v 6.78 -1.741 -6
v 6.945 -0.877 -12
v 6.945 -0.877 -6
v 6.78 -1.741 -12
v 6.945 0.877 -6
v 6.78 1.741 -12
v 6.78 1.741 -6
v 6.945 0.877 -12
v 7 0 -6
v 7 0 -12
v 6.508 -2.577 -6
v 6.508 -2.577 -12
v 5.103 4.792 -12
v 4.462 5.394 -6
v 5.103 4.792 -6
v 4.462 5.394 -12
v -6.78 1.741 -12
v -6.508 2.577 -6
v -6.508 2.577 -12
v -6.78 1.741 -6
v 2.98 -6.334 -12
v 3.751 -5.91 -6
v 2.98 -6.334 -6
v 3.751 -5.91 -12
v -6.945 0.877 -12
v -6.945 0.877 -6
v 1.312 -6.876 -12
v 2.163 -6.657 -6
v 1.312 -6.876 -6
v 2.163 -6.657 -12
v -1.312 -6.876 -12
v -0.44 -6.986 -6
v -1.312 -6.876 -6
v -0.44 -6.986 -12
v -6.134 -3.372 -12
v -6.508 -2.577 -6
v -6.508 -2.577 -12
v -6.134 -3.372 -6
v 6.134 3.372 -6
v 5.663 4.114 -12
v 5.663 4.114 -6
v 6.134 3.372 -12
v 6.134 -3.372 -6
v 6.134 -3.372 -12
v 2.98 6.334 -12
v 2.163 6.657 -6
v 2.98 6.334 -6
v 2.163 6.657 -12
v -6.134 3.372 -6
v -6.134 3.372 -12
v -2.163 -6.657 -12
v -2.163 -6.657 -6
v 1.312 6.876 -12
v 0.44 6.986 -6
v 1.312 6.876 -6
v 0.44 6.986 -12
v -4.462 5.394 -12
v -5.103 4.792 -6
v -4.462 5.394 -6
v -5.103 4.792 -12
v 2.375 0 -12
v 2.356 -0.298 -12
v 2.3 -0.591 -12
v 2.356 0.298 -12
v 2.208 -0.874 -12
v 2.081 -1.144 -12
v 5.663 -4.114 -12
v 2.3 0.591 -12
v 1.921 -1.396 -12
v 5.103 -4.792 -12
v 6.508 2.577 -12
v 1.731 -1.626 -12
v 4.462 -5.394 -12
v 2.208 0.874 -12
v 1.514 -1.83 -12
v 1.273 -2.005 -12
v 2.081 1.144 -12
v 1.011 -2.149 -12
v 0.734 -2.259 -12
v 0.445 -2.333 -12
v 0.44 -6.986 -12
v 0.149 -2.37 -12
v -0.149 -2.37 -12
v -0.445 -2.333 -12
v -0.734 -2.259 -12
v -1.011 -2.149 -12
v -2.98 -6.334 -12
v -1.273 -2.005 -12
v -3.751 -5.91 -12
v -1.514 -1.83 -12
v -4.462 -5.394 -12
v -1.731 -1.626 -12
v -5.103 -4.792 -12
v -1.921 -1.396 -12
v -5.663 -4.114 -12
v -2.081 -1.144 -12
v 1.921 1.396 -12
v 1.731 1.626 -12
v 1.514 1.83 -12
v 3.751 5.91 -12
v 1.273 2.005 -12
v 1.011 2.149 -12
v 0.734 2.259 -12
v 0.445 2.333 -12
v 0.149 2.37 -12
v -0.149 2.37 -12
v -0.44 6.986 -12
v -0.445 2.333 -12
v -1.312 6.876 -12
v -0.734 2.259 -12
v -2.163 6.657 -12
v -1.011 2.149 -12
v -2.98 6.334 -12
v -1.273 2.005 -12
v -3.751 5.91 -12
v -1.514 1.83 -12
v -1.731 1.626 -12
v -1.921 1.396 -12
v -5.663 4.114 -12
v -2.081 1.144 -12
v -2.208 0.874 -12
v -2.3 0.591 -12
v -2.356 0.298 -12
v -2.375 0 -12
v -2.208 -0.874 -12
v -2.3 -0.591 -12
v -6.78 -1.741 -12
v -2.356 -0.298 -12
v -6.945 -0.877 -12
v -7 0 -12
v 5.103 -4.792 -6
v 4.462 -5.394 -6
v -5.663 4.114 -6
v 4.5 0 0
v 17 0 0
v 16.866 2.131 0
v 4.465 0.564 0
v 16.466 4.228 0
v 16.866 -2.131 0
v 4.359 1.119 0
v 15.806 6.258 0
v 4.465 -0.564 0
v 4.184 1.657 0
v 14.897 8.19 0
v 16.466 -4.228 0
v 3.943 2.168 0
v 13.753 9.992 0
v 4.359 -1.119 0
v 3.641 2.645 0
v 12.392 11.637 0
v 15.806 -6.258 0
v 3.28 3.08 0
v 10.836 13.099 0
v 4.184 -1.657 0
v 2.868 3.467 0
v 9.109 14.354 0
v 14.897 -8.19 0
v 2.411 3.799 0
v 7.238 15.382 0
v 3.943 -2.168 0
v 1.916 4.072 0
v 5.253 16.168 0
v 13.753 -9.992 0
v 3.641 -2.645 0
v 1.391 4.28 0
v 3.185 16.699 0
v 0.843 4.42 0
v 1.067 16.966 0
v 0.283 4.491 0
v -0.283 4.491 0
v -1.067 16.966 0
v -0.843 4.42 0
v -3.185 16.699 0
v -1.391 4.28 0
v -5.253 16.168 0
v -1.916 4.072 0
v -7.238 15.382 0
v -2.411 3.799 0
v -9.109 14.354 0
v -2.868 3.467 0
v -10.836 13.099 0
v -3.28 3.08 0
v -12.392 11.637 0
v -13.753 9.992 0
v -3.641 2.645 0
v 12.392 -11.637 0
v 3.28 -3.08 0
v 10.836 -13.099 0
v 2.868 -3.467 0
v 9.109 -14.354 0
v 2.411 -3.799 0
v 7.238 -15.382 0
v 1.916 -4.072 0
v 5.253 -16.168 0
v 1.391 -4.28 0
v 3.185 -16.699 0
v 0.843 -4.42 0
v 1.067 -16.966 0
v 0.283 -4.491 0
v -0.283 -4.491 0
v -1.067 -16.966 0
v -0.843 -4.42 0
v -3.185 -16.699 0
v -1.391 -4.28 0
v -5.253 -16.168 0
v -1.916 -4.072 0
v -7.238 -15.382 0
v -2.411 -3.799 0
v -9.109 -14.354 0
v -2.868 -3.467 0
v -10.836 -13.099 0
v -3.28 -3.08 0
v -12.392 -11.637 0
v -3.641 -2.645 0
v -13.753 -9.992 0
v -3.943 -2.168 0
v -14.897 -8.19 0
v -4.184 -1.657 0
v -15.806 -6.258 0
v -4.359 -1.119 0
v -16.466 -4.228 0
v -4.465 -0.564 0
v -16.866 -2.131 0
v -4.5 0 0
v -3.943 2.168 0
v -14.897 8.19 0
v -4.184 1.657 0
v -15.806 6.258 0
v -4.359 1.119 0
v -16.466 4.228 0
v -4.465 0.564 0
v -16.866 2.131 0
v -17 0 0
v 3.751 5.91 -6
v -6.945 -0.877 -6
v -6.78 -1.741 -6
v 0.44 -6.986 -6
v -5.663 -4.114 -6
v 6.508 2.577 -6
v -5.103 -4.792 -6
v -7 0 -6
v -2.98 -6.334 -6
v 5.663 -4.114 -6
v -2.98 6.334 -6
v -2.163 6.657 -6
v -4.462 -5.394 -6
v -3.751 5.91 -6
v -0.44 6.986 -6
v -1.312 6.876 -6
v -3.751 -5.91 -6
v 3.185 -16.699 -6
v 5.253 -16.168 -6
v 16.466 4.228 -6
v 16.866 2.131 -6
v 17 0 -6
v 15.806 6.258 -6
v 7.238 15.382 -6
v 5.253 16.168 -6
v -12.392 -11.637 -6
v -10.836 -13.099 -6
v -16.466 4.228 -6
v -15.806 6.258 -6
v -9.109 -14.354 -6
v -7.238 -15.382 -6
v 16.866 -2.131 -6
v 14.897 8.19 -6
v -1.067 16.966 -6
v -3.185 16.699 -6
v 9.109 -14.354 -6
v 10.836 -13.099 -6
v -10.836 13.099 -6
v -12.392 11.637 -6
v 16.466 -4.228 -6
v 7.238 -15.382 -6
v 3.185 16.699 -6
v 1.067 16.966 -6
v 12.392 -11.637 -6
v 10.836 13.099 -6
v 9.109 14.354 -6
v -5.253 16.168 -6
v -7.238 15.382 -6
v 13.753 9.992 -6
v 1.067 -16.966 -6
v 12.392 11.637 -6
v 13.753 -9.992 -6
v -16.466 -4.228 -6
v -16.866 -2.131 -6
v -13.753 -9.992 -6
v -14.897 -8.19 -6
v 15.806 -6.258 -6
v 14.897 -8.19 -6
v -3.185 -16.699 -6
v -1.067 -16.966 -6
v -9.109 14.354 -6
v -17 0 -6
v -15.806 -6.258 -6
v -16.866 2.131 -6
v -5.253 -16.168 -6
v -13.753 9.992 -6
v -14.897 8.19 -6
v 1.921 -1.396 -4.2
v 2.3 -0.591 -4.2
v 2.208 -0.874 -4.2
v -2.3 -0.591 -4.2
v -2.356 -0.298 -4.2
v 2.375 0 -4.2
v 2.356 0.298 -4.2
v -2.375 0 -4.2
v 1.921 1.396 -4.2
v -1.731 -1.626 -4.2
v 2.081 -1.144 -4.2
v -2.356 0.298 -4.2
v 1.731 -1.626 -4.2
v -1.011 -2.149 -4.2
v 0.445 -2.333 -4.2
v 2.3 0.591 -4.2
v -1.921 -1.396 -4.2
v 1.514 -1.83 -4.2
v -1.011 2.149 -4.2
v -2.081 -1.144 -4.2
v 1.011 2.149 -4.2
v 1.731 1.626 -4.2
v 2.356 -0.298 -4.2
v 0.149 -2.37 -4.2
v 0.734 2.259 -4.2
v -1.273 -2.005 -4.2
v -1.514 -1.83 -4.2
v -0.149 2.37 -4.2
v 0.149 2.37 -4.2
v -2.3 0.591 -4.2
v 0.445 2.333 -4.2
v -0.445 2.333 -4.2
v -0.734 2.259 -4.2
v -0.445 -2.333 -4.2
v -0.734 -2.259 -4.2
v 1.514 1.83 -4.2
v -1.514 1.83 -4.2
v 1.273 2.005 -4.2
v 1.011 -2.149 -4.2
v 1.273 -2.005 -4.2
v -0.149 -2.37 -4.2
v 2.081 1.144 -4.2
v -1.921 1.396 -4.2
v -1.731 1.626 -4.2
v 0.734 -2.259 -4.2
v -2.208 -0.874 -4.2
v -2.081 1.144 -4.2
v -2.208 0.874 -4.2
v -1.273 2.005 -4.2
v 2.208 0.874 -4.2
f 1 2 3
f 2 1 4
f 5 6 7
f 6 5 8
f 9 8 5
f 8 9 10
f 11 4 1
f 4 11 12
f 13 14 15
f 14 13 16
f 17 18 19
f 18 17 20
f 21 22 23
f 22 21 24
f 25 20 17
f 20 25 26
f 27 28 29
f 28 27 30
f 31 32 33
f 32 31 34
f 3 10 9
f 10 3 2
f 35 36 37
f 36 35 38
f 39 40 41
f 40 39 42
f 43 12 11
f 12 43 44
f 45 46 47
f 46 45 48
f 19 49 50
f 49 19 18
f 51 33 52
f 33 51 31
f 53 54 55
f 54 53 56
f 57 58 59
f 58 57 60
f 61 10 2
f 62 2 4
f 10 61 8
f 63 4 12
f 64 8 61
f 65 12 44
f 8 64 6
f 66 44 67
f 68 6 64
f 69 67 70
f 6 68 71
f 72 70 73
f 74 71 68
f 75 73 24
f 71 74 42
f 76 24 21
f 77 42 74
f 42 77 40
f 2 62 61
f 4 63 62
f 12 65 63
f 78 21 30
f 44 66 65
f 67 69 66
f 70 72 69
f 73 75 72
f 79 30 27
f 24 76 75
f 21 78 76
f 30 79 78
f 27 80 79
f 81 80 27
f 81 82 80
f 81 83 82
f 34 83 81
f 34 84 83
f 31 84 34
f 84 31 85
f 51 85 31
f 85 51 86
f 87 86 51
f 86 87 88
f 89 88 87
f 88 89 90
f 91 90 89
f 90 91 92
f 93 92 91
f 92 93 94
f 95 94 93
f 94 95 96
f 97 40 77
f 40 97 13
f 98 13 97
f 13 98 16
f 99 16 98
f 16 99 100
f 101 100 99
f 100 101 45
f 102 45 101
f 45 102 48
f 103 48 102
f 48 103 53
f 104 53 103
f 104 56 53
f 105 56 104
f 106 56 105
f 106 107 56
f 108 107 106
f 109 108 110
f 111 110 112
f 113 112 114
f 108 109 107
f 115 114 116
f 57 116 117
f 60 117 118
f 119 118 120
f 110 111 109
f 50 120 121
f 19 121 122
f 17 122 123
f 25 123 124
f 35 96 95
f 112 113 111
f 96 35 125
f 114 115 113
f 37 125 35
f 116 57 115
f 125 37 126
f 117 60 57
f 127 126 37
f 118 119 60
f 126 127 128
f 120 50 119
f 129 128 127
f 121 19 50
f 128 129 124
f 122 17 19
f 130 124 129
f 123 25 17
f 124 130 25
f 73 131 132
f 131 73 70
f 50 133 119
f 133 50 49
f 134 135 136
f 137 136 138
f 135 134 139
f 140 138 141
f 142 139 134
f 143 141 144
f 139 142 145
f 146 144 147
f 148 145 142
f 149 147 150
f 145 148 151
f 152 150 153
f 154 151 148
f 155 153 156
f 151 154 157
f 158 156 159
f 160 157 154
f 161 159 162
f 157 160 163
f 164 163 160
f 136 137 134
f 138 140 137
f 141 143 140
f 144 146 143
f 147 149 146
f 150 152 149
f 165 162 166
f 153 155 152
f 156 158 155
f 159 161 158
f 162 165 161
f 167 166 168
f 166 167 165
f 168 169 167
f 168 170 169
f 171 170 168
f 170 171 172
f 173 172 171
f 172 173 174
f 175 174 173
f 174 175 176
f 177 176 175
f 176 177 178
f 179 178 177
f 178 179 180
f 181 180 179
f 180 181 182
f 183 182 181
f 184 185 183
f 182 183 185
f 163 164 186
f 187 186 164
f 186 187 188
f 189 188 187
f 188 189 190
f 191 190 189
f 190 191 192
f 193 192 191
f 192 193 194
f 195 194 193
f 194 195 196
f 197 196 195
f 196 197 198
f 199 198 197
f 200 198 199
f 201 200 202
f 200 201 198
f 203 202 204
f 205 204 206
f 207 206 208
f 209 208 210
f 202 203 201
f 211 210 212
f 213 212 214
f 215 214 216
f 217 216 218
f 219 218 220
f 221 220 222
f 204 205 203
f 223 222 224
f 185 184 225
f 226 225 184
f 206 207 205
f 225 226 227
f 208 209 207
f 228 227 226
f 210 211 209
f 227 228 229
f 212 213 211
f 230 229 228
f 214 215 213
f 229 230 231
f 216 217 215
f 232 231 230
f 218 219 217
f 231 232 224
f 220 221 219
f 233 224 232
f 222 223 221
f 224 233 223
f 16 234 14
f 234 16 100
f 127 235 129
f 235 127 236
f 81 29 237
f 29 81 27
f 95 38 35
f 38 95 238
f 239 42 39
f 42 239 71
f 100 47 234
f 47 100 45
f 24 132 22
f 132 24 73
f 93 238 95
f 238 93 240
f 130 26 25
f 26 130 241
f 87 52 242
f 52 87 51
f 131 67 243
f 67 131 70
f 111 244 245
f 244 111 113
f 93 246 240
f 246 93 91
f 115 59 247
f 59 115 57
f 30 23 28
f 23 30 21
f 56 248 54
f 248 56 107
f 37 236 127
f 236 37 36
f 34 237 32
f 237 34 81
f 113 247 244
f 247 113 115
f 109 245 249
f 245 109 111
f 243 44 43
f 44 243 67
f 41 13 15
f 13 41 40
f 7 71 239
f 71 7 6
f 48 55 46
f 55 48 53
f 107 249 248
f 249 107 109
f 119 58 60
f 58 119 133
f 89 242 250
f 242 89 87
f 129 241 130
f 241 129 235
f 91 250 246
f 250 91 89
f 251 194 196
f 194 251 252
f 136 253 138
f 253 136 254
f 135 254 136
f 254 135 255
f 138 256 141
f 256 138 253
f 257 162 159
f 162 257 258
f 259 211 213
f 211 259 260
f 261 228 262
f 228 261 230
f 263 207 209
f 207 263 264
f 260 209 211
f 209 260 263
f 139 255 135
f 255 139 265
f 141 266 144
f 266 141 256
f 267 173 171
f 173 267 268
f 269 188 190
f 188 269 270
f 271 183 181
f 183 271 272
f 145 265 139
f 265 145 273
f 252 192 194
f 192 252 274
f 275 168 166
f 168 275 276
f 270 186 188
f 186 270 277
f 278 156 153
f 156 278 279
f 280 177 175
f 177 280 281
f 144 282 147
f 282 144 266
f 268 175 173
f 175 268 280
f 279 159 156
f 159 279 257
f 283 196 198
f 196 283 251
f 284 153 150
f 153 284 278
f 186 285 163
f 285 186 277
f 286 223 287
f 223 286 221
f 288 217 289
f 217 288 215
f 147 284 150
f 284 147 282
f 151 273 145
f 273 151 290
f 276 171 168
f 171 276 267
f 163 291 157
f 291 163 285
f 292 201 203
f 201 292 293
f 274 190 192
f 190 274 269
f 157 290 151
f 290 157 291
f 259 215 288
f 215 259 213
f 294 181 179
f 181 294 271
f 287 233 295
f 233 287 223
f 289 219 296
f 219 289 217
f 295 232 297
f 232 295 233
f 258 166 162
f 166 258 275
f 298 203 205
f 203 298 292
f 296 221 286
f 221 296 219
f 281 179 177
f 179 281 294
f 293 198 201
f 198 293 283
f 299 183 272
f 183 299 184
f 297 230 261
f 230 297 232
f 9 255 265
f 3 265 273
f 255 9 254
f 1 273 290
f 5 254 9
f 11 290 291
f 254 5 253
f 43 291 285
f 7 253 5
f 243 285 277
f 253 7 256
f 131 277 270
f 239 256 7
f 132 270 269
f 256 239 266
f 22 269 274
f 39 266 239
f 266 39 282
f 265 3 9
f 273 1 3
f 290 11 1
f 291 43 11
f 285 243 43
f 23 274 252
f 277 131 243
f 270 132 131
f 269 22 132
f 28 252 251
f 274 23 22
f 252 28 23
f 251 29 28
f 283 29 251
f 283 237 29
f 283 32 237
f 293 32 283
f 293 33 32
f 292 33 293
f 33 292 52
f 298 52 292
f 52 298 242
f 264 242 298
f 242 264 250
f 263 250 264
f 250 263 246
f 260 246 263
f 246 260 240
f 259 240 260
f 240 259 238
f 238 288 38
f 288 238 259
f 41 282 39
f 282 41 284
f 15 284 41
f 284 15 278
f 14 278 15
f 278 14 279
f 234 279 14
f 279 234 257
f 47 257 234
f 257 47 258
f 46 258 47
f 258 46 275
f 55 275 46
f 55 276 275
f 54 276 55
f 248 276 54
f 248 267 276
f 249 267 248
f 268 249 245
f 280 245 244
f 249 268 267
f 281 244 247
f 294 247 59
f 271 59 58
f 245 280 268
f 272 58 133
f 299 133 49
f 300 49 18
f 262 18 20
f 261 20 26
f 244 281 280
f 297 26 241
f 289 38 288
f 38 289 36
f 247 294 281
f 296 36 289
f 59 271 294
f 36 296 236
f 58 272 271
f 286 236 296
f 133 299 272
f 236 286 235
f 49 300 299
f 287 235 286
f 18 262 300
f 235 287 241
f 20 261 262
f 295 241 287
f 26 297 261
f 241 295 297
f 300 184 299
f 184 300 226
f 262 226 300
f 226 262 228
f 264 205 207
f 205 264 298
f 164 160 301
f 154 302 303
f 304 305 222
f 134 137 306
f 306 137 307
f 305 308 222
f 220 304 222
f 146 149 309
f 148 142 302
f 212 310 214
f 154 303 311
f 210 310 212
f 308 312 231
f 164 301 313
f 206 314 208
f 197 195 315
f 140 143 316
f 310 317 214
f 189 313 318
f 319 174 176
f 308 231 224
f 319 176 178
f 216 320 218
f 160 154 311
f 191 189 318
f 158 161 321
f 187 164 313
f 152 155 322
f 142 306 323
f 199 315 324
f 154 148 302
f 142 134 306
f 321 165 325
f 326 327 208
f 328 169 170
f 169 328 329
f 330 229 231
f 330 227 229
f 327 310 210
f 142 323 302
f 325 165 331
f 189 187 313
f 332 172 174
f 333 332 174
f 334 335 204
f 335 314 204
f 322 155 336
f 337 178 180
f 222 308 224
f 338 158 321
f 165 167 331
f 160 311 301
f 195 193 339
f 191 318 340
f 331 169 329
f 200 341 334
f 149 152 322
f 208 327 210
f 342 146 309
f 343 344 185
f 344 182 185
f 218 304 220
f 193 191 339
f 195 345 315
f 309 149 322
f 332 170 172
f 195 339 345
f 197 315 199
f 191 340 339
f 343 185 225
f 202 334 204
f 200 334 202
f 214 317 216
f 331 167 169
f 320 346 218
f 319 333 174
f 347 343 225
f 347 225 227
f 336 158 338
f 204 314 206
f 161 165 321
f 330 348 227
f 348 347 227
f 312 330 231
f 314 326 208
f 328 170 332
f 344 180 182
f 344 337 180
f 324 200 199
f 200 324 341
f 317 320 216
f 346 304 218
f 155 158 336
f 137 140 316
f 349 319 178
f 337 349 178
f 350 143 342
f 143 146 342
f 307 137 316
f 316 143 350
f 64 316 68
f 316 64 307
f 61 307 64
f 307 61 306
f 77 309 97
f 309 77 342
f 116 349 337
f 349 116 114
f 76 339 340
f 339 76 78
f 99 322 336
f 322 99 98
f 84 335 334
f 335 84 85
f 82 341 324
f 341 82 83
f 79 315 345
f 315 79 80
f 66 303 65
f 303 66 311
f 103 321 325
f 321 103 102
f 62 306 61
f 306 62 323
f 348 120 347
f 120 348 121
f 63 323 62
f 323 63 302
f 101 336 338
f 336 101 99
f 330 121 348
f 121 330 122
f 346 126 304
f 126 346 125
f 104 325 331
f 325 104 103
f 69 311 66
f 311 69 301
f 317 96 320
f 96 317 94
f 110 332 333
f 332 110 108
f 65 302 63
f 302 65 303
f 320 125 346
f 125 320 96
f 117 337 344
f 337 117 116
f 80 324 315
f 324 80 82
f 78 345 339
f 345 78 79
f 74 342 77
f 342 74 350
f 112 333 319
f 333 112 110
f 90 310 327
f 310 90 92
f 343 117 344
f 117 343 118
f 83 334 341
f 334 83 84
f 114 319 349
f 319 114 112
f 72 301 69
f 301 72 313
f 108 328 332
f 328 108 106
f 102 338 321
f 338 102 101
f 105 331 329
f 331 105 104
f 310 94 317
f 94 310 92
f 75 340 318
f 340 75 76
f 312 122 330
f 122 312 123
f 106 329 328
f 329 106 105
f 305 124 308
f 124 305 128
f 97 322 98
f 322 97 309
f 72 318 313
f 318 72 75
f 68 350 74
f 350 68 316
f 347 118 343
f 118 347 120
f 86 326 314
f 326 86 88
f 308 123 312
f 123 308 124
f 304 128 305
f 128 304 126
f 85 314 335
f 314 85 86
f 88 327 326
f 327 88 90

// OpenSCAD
$fn = 50;


difference() {
	union() {
		translate(v = [0, 0, -12.0000000000]) {
			cylinder(h = 12, r = 7.0000000000);
		}
		translate(v = [0, 0, -6.0000000000]) {
			cylinder(h = 6, r = 17.0000000000);
		}
	}
	union() {
		translate(v = [0, 0, 0]) {
			rotate(a = [0, 0, 0]) {
				difference() {
					union() {
						#translate(v = [0, 0, -12.0000000000]) {
							cylinder(h = 12, r = 2.2500000000);
						}
						#translate(v = [0, 0, -4.2000000000]) {
							cylinder(h = 4.2000000000, r1 = 2.3750000000, r2 = 4.5000000000);
						}
						#translate(v = [0, 0, -12.0000000000]) {
							cylinder(h = 12, r = 2.3750000000);
						}
						#translate(v = [0, 0, -12.0000000000]) {
							cylinder(h = 12, r = 2.2500000000);
						}
					}
					union();
				}
			}
		}
	}
}
